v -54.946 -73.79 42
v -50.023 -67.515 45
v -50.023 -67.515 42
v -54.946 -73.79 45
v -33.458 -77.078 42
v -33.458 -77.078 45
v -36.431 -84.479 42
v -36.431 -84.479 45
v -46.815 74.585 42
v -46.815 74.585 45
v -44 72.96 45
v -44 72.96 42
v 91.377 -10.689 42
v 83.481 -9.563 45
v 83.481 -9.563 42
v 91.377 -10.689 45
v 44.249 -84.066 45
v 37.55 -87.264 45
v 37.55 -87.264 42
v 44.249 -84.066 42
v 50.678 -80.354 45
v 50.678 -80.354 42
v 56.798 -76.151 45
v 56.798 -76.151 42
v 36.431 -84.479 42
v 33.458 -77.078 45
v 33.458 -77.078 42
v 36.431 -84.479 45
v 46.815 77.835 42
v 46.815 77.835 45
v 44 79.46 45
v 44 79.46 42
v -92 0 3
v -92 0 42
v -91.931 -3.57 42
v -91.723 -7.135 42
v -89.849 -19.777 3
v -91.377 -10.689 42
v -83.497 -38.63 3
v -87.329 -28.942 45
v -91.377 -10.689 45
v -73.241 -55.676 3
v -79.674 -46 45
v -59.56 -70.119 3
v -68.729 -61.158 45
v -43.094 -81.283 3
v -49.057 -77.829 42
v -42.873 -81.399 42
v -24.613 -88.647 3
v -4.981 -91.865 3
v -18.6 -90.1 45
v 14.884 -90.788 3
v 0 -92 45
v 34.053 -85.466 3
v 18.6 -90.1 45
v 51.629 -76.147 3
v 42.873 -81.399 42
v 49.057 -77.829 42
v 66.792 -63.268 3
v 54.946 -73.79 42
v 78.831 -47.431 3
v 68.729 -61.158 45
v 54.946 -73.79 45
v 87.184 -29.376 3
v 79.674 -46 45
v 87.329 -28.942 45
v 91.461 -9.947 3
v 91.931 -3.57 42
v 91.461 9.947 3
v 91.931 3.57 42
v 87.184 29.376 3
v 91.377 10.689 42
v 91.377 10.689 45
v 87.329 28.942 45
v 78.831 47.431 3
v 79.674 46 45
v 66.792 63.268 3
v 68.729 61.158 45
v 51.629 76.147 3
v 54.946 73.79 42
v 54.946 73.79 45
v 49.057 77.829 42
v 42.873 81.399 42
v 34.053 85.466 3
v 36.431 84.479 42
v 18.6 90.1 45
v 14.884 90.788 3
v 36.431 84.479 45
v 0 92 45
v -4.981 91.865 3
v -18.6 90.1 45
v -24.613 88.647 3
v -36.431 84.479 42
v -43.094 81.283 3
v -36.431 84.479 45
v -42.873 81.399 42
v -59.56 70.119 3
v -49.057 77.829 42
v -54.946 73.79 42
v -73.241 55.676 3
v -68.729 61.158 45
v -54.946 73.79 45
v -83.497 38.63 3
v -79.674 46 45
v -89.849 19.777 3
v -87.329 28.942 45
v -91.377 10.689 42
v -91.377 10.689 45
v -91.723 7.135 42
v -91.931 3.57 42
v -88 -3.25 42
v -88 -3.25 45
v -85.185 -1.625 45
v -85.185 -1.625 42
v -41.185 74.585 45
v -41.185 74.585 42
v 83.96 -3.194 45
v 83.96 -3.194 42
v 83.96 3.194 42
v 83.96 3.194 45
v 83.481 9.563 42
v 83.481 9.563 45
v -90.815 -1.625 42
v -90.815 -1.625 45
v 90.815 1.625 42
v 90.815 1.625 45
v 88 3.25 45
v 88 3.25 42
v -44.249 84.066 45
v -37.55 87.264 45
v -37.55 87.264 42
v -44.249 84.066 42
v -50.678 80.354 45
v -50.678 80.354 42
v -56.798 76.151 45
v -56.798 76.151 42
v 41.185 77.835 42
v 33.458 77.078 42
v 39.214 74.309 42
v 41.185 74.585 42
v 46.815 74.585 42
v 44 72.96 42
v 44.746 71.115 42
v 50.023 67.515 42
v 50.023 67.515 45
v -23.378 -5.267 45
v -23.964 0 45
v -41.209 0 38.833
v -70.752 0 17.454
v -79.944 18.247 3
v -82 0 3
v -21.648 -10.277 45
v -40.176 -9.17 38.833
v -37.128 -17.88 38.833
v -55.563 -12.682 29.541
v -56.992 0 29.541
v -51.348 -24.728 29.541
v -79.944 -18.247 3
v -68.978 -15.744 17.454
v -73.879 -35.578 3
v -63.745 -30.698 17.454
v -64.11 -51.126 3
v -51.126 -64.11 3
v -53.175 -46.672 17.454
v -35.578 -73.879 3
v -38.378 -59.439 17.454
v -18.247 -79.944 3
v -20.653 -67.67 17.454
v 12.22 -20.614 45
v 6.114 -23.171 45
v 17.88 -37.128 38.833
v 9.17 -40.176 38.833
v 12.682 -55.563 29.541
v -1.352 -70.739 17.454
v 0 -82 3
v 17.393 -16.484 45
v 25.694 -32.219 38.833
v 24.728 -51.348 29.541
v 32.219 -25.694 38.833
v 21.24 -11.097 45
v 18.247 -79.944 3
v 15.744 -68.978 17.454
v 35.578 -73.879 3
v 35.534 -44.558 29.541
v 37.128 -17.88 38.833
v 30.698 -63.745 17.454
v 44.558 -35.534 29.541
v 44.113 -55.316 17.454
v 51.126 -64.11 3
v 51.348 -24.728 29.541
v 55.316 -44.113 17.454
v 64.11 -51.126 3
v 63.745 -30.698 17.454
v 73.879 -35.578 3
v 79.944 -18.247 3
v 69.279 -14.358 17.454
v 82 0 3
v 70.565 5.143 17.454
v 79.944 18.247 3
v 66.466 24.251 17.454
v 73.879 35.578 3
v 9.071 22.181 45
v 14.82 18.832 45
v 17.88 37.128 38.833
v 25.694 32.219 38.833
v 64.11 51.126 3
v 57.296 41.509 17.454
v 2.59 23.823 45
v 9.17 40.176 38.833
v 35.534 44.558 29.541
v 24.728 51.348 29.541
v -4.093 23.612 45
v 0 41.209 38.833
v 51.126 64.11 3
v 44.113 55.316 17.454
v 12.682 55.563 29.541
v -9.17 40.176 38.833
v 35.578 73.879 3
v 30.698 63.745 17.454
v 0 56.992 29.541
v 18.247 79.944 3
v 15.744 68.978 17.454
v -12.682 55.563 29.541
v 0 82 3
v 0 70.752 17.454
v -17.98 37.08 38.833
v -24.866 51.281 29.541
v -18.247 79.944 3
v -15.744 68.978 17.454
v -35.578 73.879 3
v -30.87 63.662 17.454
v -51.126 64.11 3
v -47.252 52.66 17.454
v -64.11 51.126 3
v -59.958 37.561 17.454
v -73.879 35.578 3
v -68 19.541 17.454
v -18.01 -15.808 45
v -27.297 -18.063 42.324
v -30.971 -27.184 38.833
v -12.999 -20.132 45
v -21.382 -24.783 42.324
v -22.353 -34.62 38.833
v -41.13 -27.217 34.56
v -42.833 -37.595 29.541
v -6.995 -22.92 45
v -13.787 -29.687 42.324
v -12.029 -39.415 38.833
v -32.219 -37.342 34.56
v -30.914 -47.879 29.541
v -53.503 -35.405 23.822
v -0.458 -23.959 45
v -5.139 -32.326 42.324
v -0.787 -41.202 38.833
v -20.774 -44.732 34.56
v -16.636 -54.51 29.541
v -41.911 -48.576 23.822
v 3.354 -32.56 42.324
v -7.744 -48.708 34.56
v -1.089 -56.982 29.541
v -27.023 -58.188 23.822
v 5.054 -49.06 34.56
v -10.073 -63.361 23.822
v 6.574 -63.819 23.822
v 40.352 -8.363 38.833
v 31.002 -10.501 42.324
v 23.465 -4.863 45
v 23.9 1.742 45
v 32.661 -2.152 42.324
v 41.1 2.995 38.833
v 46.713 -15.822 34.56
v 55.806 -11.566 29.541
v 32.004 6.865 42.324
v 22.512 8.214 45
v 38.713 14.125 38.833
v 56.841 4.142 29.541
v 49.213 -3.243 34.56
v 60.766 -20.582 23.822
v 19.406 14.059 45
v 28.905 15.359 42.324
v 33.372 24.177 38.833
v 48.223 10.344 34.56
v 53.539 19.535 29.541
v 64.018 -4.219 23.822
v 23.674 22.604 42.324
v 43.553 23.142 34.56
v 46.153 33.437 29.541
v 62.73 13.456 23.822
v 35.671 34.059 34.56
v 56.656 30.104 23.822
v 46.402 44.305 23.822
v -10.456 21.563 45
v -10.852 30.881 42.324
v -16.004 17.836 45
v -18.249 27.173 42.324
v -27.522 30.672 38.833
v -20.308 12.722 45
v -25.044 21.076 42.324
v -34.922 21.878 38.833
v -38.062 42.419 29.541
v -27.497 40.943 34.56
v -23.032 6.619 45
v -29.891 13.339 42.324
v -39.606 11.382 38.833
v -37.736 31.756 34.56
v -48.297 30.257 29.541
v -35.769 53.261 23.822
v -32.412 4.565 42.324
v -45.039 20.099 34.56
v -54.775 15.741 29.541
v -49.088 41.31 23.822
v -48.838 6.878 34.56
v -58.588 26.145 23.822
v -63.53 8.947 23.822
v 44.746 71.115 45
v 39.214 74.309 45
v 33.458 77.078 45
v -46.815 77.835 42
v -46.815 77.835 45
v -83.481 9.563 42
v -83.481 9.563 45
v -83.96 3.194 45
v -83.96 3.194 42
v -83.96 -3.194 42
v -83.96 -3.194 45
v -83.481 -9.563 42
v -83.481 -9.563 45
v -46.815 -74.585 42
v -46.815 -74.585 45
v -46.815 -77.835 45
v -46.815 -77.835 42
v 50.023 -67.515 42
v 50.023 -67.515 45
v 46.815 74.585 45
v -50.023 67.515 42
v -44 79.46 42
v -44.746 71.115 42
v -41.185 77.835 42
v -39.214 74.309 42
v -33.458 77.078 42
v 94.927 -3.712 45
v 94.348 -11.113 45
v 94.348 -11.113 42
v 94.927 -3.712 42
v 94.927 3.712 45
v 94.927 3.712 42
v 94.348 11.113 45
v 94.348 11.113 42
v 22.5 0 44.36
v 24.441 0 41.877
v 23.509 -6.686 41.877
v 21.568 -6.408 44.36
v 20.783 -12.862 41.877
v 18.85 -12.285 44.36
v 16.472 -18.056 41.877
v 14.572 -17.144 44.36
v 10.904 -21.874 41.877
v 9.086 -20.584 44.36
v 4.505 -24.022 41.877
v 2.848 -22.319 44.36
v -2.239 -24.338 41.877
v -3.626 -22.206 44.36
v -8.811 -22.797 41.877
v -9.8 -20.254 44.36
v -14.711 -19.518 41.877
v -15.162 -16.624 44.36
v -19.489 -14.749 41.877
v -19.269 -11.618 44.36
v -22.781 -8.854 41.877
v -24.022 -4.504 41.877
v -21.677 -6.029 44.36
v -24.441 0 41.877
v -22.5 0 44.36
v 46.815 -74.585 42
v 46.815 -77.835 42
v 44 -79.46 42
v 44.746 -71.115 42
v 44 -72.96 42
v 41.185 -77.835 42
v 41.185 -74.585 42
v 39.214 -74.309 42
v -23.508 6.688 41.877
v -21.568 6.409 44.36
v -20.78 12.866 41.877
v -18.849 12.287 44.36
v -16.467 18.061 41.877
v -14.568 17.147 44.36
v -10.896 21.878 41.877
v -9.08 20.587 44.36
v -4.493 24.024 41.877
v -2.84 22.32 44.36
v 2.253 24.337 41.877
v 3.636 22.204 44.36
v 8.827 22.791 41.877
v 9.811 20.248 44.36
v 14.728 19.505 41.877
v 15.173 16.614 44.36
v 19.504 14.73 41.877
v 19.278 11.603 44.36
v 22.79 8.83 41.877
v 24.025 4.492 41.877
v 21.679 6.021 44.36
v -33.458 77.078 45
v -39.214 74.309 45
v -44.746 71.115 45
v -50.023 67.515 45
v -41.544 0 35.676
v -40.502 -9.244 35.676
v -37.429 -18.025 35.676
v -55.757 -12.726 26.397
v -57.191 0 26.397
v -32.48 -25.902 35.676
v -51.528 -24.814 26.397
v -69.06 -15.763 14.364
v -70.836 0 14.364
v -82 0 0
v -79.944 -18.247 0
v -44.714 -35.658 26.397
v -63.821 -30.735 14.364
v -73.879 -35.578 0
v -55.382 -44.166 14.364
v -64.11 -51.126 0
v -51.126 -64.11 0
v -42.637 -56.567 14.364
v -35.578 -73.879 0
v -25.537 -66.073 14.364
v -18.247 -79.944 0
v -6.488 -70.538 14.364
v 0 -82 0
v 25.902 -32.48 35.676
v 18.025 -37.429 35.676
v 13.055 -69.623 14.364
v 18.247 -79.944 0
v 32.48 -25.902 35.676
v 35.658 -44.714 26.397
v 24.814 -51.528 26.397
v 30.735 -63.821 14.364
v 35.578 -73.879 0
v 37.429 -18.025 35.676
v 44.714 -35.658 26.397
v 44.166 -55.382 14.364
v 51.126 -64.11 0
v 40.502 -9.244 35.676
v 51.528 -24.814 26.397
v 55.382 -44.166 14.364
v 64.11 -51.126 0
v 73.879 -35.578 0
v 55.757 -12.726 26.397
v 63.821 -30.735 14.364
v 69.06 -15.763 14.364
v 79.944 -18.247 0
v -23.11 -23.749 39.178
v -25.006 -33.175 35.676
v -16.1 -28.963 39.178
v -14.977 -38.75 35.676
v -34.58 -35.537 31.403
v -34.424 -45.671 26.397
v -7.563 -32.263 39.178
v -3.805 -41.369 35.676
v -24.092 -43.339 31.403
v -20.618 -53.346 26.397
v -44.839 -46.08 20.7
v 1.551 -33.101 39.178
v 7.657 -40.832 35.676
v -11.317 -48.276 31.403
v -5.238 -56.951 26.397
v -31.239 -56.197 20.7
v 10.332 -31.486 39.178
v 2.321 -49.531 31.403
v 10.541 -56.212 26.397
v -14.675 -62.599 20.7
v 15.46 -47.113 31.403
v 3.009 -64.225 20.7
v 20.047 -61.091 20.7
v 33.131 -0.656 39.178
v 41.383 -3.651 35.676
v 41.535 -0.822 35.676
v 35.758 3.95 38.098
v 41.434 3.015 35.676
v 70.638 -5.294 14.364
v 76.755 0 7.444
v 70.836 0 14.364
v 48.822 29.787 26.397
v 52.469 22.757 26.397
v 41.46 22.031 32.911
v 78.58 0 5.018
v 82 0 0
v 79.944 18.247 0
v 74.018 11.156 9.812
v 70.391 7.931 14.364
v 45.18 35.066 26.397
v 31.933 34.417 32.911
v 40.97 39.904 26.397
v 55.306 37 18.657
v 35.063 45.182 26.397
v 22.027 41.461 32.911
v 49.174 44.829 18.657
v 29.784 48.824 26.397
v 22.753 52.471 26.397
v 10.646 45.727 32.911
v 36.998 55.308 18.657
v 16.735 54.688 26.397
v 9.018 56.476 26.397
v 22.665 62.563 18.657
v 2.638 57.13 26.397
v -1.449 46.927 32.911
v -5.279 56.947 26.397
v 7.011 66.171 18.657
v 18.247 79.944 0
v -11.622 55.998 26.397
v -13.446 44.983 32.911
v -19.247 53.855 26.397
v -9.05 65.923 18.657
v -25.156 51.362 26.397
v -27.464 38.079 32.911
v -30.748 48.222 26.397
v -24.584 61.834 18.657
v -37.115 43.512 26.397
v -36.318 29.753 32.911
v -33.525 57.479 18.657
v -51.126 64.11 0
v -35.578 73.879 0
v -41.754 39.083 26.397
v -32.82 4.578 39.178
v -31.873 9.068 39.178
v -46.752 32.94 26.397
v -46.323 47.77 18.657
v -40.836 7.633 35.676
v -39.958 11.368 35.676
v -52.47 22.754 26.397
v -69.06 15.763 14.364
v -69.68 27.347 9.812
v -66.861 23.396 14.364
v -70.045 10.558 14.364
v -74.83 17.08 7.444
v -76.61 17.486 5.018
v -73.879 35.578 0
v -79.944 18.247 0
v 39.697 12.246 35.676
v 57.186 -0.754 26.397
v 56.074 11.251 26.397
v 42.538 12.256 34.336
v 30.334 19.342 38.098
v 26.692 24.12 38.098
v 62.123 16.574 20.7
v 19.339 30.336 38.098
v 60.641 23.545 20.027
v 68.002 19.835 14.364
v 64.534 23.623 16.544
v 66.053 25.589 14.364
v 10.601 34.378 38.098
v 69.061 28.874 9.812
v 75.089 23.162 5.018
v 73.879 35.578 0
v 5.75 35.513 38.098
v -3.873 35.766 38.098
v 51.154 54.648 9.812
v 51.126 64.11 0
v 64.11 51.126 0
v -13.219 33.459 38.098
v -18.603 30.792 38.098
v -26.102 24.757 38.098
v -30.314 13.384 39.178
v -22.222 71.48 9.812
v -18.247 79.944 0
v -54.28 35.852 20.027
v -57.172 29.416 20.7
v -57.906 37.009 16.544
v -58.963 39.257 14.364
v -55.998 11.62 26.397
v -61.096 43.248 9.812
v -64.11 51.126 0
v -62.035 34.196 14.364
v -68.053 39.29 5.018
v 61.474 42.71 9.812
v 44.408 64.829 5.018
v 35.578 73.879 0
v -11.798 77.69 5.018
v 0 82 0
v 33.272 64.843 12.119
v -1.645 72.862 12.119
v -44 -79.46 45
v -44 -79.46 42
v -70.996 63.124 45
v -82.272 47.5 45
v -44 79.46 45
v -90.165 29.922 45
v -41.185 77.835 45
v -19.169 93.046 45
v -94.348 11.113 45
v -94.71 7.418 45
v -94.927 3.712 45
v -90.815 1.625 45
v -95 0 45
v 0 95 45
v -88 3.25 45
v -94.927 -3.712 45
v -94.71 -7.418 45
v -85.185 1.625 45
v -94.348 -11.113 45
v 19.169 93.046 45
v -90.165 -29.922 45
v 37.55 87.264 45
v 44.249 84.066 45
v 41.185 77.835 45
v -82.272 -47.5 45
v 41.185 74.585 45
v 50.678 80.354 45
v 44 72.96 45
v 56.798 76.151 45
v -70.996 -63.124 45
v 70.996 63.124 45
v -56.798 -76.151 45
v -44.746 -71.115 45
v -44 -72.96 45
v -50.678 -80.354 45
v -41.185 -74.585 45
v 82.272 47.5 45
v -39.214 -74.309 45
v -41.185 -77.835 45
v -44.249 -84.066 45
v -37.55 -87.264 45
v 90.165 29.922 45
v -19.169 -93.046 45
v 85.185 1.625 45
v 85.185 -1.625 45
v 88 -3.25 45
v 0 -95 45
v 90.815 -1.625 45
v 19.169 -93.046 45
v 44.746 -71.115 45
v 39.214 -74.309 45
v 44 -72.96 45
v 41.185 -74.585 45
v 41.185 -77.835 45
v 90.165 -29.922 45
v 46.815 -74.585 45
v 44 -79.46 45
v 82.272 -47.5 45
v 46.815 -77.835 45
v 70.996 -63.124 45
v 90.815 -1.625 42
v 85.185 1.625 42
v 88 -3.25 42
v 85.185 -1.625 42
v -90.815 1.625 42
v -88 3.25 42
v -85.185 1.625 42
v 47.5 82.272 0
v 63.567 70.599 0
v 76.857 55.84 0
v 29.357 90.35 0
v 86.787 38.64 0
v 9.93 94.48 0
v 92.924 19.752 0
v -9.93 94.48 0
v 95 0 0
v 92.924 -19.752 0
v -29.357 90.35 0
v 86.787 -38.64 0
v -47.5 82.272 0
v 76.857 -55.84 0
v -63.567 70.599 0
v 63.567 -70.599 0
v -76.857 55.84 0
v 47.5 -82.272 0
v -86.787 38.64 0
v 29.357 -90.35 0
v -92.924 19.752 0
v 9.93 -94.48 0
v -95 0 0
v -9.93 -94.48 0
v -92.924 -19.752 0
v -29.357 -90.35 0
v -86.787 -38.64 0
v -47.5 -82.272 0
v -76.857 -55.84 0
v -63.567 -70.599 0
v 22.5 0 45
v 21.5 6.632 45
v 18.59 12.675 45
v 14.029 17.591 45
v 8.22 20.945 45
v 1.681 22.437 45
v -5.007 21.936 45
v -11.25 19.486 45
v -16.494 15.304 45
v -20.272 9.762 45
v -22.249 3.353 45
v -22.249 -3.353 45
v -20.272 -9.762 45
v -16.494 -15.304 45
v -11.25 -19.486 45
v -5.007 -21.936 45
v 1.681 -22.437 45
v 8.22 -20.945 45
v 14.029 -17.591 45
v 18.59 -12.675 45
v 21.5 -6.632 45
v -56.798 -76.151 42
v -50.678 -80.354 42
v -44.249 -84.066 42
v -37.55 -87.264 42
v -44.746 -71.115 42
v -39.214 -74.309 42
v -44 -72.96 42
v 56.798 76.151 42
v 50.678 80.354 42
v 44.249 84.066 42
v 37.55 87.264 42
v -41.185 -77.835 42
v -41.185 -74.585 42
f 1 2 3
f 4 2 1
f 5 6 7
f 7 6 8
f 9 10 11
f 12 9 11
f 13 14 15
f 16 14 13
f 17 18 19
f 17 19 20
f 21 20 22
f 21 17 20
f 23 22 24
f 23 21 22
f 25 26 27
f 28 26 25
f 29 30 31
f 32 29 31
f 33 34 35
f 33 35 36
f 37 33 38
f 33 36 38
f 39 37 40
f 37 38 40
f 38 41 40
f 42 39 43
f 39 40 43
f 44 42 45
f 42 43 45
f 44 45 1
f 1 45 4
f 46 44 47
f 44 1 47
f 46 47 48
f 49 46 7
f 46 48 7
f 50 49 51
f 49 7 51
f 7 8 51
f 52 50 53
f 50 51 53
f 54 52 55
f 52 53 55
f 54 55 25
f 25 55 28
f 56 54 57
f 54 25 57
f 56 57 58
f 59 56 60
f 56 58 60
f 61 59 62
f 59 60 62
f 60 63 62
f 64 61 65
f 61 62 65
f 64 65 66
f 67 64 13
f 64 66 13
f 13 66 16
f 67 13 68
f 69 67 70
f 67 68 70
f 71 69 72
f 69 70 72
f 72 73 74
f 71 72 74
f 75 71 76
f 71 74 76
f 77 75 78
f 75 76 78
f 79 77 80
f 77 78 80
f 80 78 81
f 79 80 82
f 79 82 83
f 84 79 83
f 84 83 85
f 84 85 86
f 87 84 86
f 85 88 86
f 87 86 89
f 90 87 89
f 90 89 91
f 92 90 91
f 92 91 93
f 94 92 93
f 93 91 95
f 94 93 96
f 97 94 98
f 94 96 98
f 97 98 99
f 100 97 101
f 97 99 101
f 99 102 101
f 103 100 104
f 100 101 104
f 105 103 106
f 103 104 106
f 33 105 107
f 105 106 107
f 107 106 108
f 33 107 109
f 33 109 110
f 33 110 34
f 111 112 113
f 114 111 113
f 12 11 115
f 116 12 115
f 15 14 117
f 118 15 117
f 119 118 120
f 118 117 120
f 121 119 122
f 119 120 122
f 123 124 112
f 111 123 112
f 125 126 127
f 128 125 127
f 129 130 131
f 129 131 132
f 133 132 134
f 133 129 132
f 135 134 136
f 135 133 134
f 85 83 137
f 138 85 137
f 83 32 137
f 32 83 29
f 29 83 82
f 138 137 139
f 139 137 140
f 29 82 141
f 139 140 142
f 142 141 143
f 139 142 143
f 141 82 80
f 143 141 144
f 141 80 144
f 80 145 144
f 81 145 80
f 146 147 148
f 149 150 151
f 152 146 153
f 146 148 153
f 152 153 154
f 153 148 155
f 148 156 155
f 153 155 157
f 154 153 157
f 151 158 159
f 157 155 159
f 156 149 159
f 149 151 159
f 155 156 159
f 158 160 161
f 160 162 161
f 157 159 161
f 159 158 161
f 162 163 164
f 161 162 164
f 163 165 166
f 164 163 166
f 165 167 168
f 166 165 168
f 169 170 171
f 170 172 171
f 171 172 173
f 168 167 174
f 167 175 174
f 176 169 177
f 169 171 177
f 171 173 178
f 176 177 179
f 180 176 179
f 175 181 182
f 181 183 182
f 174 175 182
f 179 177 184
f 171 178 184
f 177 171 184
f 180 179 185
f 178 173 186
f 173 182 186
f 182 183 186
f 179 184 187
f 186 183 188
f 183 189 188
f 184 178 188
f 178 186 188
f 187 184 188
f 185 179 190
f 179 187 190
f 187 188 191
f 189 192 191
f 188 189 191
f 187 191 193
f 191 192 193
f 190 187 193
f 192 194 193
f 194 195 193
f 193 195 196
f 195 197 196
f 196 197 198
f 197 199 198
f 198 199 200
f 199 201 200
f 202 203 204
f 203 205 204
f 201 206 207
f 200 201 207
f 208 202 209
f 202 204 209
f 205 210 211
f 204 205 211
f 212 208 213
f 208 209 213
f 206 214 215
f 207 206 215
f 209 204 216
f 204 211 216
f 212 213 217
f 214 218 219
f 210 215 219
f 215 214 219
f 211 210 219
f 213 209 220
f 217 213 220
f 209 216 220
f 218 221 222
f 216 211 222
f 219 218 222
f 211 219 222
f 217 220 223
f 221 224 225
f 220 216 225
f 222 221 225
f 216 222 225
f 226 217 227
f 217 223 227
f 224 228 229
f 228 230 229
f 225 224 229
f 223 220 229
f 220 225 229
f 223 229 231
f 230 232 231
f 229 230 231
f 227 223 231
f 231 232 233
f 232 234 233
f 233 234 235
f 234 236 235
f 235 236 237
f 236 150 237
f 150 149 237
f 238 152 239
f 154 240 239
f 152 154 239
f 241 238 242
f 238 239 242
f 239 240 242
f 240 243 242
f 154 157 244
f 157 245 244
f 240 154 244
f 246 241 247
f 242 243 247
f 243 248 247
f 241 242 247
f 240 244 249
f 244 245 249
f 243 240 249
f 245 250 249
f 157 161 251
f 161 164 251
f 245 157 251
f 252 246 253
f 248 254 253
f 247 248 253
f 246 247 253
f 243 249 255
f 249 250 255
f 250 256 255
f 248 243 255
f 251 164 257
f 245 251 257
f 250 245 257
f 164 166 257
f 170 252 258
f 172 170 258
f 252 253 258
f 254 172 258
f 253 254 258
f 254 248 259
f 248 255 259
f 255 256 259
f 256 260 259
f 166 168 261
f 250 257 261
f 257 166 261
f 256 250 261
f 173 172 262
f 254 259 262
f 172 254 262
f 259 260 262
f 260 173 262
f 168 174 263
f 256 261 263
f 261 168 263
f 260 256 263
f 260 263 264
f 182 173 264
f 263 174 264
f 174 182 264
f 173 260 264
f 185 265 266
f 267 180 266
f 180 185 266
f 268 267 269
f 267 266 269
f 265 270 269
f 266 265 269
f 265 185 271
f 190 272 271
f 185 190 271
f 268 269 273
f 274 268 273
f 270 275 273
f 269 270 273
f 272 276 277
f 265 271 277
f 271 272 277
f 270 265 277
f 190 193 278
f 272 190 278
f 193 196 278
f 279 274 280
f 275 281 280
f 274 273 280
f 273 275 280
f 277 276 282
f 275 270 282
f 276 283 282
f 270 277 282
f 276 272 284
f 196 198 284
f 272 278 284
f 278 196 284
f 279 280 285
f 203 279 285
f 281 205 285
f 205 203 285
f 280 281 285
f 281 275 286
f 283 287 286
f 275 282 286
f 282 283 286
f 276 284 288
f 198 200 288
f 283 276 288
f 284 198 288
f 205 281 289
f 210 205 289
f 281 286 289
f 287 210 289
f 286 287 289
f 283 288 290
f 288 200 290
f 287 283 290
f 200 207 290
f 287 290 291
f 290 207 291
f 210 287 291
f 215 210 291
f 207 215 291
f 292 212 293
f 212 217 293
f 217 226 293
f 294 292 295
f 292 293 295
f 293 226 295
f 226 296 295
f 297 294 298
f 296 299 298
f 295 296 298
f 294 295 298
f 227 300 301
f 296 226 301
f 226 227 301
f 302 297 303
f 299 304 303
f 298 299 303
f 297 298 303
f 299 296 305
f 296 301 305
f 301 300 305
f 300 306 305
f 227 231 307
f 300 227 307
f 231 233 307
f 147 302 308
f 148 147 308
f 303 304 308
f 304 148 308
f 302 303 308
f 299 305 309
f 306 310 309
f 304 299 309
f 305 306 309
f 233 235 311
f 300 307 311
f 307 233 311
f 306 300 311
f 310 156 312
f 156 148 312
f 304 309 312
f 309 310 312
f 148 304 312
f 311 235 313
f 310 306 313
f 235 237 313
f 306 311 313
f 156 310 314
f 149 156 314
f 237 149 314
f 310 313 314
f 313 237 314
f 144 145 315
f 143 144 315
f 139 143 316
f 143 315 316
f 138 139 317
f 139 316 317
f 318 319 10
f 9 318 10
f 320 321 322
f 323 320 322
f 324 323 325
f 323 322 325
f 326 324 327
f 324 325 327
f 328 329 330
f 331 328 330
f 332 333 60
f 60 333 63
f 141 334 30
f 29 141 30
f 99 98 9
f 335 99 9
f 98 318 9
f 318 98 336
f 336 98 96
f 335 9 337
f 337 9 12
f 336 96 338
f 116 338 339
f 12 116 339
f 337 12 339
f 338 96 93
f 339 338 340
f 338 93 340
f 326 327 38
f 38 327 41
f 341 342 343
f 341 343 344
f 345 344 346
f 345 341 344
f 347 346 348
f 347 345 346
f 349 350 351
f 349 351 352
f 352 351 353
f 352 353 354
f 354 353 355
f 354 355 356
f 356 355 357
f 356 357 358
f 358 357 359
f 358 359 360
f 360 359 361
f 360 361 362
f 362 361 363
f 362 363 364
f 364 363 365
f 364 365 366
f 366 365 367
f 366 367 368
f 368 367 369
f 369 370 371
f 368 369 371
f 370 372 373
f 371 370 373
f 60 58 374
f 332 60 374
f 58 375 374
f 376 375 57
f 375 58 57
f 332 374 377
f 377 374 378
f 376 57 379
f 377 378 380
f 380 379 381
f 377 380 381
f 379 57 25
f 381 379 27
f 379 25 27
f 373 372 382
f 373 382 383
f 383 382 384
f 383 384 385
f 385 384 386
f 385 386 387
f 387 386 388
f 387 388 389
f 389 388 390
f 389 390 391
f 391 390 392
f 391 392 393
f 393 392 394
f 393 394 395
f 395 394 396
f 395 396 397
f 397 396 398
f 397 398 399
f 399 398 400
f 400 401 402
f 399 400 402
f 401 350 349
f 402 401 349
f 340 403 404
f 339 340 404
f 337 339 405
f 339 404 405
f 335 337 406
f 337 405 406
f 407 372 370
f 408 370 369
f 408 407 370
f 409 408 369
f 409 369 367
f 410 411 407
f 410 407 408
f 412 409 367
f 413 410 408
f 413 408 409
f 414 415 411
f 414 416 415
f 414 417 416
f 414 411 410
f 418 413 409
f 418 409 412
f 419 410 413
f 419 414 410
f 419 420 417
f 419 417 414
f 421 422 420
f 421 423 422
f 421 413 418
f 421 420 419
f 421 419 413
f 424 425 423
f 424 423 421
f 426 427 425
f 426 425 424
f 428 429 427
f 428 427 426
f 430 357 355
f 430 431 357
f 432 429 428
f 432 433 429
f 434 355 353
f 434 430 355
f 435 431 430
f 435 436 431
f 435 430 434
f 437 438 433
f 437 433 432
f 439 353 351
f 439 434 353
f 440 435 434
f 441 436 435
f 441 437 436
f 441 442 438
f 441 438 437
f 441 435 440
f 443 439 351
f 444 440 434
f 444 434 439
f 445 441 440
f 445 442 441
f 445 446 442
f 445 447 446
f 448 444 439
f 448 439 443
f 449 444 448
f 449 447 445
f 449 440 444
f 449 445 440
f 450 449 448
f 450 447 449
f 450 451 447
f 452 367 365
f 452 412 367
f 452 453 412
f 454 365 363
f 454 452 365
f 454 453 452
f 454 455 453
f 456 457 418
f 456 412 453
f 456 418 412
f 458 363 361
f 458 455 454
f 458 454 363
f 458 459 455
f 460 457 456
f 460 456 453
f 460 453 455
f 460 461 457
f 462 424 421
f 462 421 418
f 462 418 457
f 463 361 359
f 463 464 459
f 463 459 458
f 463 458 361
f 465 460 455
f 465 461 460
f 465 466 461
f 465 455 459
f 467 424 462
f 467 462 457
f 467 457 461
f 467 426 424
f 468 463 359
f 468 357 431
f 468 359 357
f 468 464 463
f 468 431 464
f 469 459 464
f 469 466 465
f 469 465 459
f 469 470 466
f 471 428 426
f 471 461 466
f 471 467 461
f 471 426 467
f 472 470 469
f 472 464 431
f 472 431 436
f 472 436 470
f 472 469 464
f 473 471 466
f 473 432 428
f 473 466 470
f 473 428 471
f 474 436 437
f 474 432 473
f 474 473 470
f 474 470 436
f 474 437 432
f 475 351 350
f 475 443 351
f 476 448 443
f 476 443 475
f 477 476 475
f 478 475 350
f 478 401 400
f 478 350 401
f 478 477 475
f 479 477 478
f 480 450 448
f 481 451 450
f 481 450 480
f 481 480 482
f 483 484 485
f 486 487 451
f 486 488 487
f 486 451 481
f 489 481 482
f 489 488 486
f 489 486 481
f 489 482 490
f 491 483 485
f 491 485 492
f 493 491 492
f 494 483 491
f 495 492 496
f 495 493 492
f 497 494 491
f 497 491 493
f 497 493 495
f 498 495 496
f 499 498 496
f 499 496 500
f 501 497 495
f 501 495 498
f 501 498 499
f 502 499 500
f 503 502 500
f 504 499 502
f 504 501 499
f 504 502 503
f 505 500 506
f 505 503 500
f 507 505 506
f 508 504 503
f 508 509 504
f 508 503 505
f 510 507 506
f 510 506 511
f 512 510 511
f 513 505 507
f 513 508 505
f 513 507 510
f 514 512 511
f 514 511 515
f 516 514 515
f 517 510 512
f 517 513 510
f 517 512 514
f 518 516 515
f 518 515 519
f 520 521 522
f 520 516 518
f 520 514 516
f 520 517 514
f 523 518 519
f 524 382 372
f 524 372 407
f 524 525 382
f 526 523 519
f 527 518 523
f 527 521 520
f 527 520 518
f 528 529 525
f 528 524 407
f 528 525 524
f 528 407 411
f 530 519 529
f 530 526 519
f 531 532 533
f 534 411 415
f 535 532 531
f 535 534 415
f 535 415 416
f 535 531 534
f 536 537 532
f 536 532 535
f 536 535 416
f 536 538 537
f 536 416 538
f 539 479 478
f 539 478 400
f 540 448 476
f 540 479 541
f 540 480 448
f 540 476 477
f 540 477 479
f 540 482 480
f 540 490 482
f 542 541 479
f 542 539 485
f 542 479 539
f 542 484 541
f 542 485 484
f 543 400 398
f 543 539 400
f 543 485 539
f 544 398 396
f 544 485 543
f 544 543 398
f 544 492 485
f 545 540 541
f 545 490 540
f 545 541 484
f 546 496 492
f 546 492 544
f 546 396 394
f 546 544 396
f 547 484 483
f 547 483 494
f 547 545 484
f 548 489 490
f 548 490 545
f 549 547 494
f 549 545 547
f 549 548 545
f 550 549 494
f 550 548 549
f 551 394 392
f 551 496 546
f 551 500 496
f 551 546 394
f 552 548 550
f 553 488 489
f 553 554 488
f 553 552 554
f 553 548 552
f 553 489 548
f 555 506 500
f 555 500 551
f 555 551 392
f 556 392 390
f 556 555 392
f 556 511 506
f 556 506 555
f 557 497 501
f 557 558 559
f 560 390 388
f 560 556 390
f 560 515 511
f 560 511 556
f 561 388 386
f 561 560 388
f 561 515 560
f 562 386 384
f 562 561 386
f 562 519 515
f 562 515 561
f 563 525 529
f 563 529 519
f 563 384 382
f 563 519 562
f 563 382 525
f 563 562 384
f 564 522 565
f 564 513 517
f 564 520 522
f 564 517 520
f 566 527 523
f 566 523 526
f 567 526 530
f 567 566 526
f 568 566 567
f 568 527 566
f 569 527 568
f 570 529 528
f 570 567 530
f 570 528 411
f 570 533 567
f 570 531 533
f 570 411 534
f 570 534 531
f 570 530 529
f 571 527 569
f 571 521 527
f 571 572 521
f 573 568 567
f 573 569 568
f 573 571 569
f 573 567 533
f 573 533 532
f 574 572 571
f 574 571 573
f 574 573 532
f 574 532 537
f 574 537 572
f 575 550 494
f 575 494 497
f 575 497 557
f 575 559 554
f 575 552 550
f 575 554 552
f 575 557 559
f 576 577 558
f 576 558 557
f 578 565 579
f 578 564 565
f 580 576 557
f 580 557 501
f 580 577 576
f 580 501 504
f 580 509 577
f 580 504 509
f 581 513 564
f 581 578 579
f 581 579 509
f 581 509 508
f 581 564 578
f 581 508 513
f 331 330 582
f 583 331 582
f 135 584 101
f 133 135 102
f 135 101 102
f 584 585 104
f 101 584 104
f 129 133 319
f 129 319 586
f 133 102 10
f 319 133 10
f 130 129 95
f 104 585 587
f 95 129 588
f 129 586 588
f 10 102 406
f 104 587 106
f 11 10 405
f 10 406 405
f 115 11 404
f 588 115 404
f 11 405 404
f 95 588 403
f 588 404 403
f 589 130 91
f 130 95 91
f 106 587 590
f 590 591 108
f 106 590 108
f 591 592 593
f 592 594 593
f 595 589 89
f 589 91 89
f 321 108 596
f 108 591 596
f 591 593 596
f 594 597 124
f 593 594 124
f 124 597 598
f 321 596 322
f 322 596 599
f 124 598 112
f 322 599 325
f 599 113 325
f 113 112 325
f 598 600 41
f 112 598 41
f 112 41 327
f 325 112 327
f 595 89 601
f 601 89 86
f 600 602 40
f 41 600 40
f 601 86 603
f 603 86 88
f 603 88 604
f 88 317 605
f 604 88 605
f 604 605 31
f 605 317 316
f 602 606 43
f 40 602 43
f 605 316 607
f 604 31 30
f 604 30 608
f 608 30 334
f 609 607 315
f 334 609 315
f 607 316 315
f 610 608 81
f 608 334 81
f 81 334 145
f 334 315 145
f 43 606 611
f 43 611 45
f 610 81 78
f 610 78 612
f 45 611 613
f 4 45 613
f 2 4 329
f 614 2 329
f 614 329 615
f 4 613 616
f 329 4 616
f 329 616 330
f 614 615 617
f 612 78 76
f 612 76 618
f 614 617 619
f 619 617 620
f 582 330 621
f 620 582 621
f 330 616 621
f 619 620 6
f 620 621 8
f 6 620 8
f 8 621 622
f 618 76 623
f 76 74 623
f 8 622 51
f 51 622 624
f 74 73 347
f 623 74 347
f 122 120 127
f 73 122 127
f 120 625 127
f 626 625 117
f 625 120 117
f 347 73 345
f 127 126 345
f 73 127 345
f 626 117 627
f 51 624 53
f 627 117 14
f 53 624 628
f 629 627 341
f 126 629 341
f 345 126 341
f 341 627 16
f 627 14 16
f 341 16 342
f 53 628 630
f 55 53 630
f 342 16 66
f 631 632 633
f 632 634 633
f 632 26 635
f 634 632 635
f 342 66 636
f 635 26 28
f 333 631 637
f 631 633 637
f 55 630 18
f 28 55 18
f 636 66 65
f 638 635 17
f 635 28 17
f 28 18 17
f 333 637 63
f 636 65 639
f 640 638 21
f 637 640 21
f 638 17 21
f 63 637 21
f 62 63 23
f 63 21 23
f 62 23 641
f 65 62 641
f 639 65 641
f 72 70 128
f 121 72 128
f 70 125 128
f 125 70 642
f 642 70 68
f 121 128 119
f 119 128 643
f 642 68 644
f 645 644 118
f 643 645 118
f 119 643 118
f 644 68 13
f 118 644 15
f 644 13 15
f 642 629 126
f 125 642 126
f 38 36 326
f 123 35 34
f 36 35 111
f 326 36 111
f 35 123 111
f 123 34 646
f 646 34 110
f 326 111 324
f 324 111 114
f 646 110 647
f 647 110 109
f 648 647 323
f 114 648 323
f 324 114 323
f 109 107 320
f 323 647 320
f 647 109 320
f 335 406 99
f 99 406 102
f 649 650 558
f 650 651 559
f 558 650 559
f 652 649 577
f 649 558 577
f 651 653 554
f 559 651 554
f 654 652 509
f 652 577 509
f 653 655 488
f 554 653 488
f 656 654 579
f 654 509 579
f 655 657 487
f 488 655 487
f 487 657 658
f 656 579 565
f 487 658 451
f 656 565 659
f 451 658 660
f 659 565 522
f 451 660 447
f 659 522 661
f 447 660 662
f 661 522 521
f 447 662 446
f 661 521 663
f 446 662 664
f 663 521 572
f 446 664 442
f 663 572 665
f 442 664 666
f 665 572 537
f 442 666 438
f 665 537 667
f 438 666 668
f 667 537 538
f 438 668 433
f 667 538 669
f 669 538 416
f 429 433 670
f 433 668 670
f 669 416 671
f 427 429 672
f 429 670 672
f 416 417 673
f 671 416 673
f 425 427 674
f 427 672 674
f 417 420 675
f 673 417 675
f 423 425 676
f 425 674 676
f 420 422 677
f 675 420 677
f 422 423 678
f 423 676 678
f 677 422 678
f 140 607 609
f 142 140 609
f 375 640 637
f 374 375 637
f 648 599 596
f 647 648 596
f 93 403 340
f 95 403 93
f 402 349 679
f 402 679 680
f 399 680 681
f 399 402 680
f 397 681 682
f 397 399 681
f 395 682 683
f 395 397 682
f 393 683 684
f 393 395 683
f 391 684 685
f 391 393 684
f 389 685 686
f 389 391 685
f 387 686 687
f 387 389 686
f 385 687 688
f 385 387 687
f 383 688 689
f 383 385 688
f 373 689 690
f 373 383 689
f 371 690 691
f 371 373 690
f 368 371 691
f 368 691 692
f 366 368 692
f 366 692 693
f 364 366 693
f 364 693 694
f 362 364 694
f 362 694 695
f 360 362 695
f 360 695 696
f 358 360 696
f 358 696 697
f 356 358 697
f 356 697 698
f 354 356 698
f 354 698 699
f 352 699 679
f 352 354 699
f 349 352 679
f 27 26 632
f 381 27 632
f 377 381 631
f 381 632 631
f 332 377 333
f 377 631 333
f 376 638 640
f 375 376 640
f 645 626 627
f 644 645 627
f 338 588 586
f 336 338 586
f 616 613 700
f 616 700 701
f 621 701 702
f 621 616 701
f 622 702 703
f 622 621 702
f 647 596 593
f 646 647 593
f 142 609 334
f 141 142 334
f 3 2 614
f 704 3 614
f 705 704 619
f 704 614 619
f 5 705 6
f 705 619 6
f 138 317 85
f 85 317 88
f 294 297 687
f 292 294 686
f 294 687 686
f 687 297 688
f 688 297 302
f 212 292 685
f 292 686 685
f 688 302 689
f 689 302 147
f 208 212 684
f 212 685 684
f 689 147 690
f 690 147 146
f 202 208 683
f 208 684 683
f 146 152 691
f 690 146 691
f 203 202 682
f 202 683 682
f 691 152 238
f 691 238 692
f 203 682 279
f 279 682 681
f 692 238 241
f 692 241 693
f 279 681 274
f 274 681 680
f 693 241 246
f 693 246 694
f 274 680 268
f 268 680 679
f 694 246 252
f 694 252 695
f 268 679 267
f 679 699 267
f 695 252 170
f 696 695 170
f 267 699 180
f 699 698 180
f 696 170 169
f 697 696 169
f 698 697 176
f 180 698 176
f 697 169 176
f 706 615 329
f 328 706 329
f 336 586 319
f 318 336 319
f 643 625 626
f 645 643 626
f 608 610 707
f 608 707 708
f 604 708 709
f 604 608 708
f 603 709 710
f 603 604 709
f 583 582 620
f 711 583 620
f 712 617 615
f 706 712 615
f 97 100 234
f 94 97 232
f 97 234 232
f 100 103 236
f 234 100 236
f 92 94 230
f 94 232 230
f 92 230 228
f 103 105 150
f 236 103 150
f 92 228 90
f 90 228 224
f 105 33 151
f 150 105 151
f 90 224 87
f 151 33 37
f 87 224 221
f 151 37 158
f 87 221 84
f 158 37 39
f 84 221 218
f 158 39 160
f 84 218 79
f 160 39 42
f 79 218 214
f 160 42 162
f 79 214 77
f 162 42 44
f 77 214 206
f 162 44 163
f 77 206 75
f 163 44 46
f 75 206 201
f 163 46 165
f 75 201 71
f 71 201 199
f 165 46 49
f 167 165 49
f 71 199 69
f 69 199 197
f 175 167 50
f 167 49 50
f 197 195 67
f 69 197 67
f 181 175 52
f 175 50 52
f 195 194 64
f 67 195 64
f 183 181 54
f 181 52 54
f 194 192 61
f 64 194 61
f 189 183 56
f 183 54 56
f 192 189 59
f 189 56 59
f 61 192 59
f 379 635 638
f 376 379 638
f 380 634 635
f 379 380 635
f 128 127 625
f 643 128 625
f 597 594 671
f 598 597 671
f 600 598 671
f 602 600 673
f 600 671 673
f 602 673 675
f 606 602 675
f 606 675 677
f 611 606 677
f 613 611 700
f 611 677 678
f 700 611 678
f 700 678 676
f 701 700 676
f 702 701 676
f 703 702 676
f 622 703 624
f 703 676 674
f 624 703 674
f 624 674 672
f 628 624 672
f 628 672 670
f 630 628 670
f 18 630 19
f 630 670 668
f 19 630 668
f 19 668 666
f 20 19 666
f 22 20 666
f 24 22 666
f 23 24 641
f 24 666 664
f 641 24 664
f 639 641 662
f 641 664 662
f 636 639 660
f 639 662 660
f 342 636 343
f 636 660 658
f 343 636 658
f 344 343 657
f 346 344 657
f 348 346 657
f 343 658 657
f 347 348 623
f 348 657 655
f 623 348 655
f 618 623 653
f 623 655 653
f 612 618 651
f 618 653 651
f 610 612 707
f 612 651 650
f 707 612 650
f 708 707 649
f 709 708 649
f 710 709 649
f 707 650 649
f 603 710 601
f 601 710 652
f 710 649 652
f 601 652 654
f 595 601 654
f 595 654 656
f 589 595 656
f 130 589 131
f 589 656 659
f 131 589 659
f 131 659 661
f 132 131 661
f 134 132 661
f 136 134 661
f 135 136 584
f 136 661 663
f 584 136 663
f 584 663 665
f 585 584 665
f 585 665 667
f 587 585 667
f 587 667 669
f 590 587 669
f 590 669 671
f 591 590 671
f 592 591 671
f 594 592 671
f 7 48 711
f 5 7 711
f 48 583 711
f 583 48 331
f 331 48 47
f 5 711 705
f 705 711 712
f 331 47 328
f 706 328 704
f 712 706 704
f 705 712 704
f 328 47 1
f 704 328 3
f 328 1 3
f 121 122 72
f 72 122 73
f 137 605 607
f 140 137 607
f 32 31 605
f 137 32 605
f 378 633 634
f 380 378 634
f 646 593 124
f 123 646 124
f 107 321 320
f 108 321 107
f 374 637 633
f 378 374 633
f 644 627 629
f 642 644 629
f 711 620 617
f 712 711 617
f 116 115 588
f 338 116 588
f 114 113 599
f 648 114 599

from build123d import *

# Parameters (mm, degrees)
SKETCH002_W           = 150
SKETCH002_H           = 20
POCKET_DEPTH          = 50
SKETCH001_R           = 22.5
POCKET001_DEPTH       = 45.001
PAD_DEPTH             = 3
POLARPATTERN_COUNT    = 6
POCKET002_DEPTH       = 5
POLARPATTERN001_COUNT = 6
CHAMFER_SIZE          = 2


with BuildPart() as part:
    # Sketch → Revolution (revolve)
    with BuildSketch(Plane.XZ):
        with BuildLine():
            Line((-95, 45), (-95, 0))
            Line((-95, 0), (-82, 0))
            ThreePointArc((0, 45), (-46.768045, 33.010659), (-82, 0))
            Line((0, 45), (0, 48))
            ThreePointArc((0, 48), (-46.768045, 36.010659), (-82, 3))
            Line((-82, 3), (-92, 3))
            Line((-92, 3), (-92, 45))
            Line((-92, 45), (-95, 45))
        make_face()
    revolve(axis=Axis((0, 0, 0), (0, 0, 1)))

    # Sketch002 → Pocket (cut, symmetric)
    with BuildSketch(Plane.XZ):
        with Locations((0, 55)):
            Rectangle(SKETCH002_W, SKETCH002_H)
    extrude(amount=POCKET_DEPTH, both=True, mode=Mode.SUBTRACT)

    # Sketch001 → Pocket001 (cut, through all)
    with BuildSketch(Plane.XY):
        Circle(SKETCH001_R)
    extrude(amount=POCKET001_DEPTH, mode=Mode.SUBTRACT)

    # Sketch003 → Pad (join)
    with BuildSketch(Plane.XY.offset(45)):
        with BuildLine():
            ThreePointArc((-94.347763, 11.113041), (-95, 0), (-94.347763, -11.113041))
            Line((-83.480776, -9.563365), (-94.347763, -11.113041))
            ThreePointArc((-83.480776, 9.563365), (-84.020478, 0), (-83.480776, -9.563365))
            Line((-83.480776, 9.563365), (-94.347763, 11.113041))
        make_face()
    pad = extrude(amount=-PAD_DEPTH)

    # PolarPattern: Pad ×6 about axis
    polarpattern_axis = Axis((0, 0, 0), (0, 0, 1))
    for i in range(1, POLARPATTERN_COUNT):
        add(pad.rotate(polarpattern_axis, i * 360 / POLARPATTERN_COUNT))

    # Sketch004 → Pocket002 (cut)
    with BuildSketch(Plane.XY.offset(45)):
        Polygon((-85.185417, 1.625), (-88, 3.25), (-90.814583, 1.625), (-90.814583, -1.625), (-88, -3.25), (-85.185417, -1.625), align=None)
    pocket002 = extrude(amount=-POCKET002_DEPTH, mode=Mode.SUBTRACT)

    # PolarPattern001: Pocket002 ×6 about axis
    polarpattern001_axis = Axis((0, 0, 0), (0, 0, 1))
    for i in range(1, POLARPATTERN001_COUNT):
        add(pocket002.rotate(polarpattern001_axis, i * 360 / POLARPATTERN001_COUNT), mode=Mode.SUBTRACT)

    # Chamfer
    chamfer_edges = [part.edges().sort_by_distance(p)[0] for p in [
        (0, 22.5, 42.360291),
        (0, -22.5, 42.360291),
    ]]
    chamfer(chamfer_edges, length=CHAMFER_SIZE)


solid = part.part
